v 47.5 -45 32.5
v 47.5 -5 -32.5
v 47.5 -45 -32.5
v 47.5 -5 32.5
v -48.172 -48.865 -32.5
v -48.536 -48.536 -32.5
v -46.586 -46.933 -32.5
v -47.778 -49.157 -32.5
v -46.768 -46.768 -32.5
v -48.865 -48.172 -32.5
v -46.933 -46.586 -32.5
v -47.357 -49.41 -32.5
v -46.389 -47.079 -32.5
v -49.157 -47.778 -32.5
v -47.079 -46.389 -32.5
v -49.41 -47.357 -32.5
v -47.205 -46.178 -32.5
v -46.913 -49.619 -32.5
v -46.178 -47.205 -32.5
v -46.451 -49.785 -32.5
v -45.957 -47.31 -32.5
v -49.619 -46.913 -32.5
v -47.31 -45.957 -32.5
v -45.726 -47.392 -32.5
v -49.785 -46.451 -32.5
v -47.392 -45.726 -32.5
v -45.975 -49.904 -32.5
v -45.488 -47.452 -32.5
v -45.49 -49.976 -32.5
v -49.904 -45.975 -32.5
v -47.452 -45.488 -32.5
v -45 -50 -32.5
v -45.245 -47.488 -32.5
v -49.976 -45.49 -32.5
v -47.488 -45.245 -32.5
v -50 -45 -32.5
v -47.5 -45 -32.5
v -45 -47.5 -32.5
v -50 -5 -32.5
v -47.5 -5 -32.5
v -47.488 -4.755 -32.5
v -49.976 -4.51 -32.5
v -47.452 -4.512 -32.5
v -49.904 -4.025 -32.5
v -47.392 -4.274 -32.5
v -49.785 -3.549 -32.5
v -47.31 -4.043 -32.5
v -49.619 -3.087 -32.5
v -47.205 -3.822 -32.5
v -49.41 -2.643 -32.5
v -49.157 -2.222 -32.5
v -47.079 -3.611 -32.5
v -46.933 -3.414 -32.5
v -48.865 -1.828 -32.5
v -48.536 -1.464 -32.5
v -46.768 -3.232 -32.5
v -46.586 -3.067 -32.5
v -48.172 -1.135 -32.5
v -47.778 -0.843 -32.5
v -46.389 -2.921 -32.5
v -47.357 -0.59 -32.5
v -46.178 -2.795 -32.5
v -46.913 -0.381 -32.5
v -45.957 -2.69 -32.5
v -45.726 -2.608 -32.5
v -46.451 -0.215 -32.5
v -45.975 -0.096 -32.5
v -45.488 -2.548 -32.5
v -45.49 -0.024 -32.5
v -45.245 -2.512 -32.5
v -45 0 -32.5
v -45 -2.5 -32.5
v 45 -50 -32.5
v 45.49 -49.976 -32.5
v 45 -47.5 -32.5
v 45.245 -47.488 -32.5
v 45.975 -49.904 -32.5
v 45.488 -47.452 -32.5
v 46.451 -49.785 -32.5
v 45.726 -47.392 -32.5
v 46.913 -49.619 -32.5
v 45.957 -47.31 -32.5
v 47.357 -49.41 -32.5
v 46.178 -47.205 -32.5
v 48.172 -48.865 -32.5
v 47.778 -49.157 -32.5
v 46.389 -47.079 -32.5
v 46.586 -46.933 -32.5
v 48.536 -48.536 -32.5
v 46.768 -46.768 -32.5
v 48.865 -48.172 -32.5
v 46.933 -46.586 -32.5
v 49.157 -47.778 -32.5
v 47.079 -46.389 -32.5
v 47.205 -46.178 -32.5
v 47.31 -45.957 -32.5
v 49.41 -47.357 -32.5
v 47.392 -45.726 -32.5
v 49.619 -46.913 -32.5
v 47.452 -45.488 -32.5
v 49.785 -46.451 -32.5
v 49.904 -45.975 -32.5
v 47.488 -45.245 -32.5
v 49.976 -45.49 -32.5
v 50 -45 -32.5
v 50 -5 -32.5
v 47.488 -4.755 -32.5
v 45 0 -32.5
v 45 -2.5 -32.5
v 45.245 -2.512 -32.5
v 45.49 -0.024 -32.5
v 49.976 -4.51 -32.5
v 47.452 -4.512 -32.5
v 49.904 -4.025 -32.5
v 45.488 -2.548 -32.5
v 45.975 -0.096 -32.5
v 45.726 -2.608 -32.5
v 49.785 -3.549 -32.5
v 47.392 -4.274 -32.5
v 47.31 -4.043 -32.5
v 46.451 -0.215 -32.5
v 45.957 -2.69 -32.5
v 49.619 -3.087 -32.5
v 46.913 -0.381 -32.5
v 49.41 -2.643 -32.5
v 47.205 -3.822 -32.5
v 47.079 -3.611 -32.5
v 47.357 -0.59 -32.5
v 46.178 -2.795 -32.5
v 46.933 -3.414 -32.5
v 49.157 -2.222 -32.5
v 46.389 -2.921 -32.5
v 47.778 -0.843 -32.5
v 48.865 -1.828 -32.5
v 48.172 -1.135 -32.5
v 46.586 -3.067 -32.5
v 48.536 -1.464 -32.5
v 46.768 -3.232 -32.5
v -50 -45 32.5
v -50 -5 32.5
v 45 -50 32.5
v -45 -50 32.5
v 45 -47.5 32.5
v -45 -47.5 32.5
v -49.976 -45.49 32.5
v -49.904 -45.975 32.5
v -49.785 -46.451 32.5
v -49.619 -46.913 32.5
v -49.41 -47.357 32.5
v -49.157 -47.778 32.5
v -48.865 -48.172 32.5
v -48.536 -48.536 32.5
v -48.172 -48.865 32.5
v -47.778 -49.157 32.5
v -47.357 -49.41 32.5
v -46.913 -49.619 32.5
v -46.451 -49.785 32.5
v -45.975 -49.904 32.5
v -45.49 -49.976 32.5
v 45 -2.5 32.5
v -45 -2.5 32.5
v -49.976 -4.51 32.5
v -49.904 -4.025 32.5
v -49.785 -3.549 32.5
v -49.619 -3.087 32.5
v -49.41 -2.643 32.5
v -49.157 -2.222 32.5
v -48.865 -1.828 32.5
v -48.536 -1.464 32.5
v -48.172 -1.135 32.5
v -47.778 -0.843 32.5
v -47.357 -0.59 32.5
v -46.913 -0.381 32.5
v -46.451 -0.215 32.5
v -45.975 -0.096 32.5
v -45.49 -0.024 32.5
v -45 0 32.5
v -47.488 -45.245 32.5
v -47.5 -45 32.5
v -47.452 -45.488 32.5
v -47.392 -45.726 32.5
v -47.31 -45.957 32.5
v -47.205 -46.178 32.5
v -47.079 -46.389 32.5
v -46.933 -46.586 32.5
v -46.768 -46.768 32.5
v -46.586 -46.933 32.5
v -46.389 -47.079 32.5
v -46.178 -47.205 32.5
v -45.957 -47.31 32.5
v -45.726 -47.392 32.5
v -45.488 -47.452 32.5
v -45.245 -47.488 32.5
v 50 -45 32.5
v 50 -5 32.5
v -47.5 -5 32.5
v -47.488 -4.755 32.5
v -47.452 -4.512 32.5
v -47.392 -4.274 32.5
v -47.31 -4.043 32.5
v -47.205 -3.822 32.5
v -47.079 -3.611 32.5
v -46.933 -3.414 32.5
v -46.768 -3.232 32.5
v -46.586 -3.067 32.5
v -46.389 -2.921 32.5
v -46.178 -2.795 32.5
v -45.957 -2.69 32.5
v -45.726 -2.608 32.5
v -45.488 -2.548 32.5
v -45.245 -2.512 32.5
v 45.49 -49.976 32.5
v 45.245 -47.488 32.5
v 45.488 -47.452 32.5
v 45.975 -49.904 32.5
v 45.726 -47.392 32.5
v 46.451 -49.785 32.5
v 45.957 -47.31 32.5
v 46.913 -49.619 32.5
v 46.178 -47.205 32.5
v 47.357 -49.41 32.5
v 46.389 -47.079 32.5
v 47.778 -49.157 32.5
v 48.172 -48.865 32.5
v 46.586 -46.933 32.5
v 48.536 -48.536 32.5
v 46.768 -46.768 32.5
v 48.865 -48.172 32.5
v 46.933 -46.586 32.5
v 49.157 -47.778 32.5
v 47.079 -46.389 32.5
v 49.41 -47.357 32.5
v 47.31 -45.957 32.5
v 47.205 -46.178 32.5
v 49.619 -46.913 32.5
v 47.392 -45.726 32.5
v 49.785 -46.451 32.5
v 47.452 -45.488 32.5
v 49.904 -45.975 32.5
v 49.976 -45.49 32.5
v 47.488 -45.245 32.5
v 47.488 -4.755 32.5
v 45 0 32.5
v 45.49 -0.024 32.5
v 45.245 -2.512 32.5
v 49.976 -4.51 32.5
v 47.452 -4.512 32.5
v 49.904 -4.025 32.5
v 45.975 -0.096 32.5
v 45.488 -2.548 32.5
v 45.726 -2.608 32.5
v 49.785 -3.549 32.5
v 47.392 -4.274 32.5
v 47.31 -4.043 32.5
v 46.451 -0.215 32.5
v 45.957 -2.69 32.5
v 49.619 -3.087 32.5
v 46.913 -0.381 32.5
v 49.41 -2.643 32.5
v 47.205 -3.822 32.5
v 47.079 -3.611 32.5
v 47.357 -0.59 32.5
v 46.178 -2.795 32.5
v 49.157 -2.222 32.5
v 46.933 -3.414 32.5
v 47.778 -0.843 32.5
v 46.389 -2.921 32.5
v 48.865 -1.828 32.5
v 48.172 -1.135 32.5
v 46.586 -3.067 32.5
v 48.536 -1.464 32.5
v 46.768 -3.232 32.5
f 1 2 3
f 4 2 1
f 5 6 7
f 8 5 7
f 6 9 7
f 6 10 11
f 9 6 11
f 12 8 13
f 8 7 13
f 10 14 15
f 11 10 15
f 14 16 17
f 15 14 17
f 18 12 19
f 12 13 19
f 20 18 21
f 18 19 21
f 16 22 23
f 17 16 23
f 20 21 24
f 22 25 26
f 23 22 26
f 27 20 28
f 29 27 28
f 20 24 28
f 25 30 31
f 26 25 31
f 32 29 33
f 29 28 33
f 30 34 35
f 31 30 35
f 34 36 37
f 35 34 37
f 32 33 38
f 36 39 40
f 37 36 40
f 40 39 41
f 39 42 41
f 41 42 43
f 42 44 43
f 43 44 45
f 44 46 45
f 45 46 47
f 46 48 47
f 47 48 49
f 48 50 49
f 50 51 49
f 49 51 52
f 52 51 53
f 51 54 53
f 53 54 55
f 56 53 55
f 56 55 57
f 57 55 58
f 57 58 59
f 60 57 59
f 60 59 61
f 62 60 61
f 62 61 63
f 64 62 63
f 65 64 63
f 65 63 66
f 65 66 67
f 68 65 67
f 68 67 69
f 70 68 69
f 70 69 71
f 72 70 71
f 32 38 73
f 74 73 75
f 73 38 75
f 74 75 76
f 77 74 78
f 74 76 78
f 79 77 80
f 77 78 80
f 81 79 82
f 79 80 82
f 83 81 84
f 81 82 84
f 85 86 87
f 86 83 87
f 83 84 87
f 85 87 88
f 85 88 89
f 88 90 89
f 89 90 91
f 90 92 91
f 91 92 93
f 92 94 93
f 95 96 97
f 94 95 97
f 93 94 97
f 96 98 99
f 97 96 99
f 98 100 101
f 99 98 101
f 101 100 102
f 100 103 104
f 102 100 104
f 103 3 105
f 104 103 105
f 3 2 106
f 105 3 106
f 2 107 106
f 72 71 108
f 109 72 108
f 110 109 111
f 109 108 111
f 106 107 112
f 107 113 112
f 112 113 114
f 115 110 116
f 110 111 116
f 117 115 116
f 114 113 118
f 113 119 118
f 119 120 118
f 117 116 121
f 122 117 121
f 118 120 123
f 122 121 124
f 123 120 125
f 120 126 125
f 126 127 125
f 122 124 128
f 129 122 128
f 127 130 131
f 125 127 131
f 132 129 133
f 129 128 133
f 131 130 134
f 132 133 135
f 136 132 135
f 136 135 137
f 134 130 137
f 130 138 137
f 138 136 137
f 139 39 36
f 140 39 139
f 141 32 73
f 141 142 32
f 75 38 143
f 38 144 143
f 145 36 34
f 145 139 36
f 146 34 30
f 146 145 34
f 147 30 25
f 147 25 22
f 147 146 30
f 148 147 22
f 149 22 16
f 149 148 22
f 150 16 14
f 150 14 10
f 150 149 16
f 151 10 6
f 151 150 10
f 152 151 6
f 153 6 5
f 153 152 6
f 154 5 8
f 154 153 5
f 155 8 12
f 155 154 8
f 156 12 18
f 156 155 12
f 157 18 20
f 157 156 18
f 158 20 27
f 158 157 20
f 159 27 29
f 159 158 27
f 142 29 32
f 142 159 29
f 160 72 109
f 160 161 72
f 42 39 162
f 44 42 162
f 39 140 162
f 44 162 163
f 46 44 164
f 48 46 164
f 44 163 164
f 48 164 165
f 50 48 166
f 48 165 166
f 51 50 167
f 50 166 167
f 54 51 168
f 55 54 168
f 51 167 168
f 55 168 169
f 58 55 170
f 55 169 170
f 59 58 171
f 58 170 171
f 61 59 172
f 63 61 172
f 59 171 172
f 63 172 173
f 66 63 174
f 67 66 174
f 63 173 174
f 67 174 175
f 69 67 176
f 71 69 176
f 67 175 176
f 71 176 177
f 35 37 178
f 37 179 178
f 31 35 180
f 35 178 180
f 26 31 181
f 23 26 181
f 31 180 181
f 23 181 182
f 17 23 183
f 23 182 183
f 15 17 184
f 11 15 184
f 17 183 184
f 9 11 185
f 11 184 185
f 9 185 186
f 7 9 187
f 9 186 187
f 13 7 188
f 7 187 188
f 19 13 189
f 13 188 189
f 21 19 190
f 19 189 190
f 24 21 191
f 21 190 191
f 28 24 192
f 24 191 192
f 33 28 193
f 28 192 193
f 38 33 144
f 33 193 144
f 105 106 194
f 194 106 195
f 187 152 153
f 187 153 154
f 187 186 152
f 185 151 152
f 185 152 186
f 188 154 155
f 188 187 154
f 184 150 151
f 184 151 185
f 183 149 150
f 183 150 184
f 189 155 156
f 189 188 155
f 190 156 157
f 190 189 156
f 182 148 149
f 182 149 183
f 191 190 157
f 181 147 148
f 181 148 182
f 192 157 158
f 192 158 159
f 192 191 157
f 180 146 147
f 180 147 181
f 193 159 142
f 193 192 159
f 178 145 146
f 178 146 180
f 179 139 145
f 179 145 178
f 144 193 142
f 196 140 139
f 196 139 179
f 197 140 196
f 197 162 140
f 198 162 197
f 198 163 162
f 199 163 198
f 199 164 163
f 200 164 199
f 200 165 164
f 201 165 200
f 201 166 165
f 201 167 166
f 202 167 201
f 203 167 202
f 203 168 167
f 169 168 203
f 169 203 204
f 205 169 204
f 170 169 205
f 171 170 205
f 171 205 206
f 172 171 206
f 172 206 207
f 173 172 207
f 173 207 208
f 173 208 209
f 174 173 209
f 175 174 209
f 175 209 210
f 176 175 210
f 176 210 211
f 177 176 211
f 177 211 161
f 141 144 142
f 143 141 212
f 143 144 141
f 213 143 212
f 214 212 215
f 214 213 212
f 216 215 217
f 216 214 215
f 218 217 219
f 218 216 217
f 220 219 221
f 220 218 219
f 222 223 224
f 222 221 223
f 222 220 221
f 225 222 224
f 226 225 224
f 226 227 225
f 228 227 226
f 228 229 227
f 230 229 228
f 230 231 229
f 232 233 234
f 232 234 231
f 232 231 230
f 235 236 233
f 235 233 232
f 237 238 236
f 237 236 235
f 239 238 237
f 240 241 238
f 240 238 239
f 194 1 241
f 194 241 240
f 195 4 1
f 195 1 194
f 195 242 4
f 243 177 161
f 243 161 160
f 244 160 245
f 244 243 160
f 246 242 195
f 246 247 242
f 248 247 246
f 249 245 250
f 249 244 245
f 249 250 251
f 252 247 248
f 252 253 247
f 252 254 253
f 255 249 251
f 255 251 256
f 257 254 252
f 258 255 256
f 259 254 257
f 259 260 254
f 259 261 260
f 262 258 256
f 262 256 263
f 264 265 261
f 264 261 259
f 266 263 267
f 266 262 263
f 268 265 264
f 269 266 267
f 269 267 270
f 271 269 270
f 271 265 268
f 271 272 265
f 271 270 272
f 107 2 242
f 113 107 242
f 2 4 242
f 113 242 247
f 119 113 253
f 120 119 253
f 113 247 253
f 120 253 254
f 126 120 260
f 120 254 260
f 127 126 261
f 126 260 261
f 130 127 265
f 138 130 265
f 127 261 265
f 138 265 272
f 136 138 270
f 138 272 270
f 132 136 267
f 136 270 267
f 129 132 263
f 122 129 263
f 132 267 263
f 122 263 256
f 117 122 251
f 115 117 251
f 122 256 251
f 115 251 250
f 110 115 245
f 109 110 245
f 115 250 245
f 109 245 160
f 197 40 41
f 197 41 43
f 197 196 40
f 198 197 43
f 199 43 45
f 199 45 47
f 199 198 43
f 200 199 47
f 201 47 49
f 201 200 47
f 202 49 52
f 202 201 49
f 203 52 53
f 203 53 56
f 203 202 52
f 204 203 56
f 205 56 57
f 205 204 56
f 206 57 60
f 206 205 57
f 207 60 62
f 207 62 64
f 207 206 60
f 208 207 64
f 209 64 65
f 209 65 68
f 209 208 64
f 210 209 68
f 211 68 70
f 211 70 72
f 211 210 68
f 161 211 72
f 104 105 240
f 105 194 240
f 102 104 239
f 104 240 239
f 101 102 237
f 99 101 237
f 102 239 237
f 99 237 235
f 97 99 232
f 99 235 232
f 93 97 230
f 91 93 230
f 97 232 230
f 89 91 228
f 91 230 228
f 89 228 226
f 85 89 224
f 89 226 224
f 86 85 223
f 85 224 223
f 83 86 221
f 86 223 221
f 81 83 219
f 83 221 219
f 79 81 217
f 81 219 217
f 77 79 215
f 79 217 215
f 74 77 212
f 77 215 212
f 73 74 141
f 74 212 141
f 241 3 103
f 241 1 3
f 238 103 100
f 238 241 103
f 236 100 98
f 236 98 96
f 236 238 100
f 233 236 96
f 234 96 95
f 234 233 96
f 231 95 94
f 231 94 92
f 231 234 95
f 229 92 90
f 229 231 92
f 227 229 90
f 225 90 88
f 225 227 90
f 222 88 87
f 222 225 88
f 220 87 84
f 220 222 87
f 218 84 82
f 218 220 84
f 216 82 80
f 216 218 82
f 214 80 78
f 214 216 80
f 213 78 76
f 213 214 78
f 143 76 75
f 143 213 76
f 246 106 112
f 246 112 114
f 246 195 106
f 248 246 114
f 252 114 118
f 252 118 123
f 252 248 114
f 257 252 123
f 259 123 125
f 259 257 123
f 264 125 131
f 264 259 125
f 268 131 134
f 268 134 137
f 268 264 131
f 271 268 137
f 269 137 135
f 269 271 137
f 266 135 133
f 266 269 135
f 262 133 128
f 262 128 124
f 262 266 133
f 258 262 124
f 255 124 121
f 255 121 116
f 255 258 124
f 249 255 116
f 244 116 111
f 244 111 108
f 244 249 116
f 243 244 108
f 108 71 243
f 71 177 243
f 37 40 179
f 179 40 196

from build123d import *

# Parameters (mm, degrees)
F0_W     = 100
F0_H     = 65
F1_DEPTH = 50
F2_R     = 5
F3_T     = -2.5


with BuildPart() as f1:
    # F0 (on Front) → F1 (new body)
    with BuildSketch(Plane.XZ):
        Rectangle(F0_W, F0_H)
    extrude(amount=F1_DEPTH)

    # F2
    f2_edges = [f1.edges().sort_by_distance(p)[0] for p in [
        (-50, -50, 0),
        (50, -50, 0),
        (-50, 0, 0),
        (50, 0, 0),
    ]]
    fillet(f2_edges, radius=F2_R)

    # F3
    f3_openings = [f1.faces().sort_by_distance(p)[0] for p in [
        (0, -25, 32.5),
        (0, -25, -32.5),
    ]]
    offset(amount=F3_T, openings=f3_openings)


solid = f1.part
